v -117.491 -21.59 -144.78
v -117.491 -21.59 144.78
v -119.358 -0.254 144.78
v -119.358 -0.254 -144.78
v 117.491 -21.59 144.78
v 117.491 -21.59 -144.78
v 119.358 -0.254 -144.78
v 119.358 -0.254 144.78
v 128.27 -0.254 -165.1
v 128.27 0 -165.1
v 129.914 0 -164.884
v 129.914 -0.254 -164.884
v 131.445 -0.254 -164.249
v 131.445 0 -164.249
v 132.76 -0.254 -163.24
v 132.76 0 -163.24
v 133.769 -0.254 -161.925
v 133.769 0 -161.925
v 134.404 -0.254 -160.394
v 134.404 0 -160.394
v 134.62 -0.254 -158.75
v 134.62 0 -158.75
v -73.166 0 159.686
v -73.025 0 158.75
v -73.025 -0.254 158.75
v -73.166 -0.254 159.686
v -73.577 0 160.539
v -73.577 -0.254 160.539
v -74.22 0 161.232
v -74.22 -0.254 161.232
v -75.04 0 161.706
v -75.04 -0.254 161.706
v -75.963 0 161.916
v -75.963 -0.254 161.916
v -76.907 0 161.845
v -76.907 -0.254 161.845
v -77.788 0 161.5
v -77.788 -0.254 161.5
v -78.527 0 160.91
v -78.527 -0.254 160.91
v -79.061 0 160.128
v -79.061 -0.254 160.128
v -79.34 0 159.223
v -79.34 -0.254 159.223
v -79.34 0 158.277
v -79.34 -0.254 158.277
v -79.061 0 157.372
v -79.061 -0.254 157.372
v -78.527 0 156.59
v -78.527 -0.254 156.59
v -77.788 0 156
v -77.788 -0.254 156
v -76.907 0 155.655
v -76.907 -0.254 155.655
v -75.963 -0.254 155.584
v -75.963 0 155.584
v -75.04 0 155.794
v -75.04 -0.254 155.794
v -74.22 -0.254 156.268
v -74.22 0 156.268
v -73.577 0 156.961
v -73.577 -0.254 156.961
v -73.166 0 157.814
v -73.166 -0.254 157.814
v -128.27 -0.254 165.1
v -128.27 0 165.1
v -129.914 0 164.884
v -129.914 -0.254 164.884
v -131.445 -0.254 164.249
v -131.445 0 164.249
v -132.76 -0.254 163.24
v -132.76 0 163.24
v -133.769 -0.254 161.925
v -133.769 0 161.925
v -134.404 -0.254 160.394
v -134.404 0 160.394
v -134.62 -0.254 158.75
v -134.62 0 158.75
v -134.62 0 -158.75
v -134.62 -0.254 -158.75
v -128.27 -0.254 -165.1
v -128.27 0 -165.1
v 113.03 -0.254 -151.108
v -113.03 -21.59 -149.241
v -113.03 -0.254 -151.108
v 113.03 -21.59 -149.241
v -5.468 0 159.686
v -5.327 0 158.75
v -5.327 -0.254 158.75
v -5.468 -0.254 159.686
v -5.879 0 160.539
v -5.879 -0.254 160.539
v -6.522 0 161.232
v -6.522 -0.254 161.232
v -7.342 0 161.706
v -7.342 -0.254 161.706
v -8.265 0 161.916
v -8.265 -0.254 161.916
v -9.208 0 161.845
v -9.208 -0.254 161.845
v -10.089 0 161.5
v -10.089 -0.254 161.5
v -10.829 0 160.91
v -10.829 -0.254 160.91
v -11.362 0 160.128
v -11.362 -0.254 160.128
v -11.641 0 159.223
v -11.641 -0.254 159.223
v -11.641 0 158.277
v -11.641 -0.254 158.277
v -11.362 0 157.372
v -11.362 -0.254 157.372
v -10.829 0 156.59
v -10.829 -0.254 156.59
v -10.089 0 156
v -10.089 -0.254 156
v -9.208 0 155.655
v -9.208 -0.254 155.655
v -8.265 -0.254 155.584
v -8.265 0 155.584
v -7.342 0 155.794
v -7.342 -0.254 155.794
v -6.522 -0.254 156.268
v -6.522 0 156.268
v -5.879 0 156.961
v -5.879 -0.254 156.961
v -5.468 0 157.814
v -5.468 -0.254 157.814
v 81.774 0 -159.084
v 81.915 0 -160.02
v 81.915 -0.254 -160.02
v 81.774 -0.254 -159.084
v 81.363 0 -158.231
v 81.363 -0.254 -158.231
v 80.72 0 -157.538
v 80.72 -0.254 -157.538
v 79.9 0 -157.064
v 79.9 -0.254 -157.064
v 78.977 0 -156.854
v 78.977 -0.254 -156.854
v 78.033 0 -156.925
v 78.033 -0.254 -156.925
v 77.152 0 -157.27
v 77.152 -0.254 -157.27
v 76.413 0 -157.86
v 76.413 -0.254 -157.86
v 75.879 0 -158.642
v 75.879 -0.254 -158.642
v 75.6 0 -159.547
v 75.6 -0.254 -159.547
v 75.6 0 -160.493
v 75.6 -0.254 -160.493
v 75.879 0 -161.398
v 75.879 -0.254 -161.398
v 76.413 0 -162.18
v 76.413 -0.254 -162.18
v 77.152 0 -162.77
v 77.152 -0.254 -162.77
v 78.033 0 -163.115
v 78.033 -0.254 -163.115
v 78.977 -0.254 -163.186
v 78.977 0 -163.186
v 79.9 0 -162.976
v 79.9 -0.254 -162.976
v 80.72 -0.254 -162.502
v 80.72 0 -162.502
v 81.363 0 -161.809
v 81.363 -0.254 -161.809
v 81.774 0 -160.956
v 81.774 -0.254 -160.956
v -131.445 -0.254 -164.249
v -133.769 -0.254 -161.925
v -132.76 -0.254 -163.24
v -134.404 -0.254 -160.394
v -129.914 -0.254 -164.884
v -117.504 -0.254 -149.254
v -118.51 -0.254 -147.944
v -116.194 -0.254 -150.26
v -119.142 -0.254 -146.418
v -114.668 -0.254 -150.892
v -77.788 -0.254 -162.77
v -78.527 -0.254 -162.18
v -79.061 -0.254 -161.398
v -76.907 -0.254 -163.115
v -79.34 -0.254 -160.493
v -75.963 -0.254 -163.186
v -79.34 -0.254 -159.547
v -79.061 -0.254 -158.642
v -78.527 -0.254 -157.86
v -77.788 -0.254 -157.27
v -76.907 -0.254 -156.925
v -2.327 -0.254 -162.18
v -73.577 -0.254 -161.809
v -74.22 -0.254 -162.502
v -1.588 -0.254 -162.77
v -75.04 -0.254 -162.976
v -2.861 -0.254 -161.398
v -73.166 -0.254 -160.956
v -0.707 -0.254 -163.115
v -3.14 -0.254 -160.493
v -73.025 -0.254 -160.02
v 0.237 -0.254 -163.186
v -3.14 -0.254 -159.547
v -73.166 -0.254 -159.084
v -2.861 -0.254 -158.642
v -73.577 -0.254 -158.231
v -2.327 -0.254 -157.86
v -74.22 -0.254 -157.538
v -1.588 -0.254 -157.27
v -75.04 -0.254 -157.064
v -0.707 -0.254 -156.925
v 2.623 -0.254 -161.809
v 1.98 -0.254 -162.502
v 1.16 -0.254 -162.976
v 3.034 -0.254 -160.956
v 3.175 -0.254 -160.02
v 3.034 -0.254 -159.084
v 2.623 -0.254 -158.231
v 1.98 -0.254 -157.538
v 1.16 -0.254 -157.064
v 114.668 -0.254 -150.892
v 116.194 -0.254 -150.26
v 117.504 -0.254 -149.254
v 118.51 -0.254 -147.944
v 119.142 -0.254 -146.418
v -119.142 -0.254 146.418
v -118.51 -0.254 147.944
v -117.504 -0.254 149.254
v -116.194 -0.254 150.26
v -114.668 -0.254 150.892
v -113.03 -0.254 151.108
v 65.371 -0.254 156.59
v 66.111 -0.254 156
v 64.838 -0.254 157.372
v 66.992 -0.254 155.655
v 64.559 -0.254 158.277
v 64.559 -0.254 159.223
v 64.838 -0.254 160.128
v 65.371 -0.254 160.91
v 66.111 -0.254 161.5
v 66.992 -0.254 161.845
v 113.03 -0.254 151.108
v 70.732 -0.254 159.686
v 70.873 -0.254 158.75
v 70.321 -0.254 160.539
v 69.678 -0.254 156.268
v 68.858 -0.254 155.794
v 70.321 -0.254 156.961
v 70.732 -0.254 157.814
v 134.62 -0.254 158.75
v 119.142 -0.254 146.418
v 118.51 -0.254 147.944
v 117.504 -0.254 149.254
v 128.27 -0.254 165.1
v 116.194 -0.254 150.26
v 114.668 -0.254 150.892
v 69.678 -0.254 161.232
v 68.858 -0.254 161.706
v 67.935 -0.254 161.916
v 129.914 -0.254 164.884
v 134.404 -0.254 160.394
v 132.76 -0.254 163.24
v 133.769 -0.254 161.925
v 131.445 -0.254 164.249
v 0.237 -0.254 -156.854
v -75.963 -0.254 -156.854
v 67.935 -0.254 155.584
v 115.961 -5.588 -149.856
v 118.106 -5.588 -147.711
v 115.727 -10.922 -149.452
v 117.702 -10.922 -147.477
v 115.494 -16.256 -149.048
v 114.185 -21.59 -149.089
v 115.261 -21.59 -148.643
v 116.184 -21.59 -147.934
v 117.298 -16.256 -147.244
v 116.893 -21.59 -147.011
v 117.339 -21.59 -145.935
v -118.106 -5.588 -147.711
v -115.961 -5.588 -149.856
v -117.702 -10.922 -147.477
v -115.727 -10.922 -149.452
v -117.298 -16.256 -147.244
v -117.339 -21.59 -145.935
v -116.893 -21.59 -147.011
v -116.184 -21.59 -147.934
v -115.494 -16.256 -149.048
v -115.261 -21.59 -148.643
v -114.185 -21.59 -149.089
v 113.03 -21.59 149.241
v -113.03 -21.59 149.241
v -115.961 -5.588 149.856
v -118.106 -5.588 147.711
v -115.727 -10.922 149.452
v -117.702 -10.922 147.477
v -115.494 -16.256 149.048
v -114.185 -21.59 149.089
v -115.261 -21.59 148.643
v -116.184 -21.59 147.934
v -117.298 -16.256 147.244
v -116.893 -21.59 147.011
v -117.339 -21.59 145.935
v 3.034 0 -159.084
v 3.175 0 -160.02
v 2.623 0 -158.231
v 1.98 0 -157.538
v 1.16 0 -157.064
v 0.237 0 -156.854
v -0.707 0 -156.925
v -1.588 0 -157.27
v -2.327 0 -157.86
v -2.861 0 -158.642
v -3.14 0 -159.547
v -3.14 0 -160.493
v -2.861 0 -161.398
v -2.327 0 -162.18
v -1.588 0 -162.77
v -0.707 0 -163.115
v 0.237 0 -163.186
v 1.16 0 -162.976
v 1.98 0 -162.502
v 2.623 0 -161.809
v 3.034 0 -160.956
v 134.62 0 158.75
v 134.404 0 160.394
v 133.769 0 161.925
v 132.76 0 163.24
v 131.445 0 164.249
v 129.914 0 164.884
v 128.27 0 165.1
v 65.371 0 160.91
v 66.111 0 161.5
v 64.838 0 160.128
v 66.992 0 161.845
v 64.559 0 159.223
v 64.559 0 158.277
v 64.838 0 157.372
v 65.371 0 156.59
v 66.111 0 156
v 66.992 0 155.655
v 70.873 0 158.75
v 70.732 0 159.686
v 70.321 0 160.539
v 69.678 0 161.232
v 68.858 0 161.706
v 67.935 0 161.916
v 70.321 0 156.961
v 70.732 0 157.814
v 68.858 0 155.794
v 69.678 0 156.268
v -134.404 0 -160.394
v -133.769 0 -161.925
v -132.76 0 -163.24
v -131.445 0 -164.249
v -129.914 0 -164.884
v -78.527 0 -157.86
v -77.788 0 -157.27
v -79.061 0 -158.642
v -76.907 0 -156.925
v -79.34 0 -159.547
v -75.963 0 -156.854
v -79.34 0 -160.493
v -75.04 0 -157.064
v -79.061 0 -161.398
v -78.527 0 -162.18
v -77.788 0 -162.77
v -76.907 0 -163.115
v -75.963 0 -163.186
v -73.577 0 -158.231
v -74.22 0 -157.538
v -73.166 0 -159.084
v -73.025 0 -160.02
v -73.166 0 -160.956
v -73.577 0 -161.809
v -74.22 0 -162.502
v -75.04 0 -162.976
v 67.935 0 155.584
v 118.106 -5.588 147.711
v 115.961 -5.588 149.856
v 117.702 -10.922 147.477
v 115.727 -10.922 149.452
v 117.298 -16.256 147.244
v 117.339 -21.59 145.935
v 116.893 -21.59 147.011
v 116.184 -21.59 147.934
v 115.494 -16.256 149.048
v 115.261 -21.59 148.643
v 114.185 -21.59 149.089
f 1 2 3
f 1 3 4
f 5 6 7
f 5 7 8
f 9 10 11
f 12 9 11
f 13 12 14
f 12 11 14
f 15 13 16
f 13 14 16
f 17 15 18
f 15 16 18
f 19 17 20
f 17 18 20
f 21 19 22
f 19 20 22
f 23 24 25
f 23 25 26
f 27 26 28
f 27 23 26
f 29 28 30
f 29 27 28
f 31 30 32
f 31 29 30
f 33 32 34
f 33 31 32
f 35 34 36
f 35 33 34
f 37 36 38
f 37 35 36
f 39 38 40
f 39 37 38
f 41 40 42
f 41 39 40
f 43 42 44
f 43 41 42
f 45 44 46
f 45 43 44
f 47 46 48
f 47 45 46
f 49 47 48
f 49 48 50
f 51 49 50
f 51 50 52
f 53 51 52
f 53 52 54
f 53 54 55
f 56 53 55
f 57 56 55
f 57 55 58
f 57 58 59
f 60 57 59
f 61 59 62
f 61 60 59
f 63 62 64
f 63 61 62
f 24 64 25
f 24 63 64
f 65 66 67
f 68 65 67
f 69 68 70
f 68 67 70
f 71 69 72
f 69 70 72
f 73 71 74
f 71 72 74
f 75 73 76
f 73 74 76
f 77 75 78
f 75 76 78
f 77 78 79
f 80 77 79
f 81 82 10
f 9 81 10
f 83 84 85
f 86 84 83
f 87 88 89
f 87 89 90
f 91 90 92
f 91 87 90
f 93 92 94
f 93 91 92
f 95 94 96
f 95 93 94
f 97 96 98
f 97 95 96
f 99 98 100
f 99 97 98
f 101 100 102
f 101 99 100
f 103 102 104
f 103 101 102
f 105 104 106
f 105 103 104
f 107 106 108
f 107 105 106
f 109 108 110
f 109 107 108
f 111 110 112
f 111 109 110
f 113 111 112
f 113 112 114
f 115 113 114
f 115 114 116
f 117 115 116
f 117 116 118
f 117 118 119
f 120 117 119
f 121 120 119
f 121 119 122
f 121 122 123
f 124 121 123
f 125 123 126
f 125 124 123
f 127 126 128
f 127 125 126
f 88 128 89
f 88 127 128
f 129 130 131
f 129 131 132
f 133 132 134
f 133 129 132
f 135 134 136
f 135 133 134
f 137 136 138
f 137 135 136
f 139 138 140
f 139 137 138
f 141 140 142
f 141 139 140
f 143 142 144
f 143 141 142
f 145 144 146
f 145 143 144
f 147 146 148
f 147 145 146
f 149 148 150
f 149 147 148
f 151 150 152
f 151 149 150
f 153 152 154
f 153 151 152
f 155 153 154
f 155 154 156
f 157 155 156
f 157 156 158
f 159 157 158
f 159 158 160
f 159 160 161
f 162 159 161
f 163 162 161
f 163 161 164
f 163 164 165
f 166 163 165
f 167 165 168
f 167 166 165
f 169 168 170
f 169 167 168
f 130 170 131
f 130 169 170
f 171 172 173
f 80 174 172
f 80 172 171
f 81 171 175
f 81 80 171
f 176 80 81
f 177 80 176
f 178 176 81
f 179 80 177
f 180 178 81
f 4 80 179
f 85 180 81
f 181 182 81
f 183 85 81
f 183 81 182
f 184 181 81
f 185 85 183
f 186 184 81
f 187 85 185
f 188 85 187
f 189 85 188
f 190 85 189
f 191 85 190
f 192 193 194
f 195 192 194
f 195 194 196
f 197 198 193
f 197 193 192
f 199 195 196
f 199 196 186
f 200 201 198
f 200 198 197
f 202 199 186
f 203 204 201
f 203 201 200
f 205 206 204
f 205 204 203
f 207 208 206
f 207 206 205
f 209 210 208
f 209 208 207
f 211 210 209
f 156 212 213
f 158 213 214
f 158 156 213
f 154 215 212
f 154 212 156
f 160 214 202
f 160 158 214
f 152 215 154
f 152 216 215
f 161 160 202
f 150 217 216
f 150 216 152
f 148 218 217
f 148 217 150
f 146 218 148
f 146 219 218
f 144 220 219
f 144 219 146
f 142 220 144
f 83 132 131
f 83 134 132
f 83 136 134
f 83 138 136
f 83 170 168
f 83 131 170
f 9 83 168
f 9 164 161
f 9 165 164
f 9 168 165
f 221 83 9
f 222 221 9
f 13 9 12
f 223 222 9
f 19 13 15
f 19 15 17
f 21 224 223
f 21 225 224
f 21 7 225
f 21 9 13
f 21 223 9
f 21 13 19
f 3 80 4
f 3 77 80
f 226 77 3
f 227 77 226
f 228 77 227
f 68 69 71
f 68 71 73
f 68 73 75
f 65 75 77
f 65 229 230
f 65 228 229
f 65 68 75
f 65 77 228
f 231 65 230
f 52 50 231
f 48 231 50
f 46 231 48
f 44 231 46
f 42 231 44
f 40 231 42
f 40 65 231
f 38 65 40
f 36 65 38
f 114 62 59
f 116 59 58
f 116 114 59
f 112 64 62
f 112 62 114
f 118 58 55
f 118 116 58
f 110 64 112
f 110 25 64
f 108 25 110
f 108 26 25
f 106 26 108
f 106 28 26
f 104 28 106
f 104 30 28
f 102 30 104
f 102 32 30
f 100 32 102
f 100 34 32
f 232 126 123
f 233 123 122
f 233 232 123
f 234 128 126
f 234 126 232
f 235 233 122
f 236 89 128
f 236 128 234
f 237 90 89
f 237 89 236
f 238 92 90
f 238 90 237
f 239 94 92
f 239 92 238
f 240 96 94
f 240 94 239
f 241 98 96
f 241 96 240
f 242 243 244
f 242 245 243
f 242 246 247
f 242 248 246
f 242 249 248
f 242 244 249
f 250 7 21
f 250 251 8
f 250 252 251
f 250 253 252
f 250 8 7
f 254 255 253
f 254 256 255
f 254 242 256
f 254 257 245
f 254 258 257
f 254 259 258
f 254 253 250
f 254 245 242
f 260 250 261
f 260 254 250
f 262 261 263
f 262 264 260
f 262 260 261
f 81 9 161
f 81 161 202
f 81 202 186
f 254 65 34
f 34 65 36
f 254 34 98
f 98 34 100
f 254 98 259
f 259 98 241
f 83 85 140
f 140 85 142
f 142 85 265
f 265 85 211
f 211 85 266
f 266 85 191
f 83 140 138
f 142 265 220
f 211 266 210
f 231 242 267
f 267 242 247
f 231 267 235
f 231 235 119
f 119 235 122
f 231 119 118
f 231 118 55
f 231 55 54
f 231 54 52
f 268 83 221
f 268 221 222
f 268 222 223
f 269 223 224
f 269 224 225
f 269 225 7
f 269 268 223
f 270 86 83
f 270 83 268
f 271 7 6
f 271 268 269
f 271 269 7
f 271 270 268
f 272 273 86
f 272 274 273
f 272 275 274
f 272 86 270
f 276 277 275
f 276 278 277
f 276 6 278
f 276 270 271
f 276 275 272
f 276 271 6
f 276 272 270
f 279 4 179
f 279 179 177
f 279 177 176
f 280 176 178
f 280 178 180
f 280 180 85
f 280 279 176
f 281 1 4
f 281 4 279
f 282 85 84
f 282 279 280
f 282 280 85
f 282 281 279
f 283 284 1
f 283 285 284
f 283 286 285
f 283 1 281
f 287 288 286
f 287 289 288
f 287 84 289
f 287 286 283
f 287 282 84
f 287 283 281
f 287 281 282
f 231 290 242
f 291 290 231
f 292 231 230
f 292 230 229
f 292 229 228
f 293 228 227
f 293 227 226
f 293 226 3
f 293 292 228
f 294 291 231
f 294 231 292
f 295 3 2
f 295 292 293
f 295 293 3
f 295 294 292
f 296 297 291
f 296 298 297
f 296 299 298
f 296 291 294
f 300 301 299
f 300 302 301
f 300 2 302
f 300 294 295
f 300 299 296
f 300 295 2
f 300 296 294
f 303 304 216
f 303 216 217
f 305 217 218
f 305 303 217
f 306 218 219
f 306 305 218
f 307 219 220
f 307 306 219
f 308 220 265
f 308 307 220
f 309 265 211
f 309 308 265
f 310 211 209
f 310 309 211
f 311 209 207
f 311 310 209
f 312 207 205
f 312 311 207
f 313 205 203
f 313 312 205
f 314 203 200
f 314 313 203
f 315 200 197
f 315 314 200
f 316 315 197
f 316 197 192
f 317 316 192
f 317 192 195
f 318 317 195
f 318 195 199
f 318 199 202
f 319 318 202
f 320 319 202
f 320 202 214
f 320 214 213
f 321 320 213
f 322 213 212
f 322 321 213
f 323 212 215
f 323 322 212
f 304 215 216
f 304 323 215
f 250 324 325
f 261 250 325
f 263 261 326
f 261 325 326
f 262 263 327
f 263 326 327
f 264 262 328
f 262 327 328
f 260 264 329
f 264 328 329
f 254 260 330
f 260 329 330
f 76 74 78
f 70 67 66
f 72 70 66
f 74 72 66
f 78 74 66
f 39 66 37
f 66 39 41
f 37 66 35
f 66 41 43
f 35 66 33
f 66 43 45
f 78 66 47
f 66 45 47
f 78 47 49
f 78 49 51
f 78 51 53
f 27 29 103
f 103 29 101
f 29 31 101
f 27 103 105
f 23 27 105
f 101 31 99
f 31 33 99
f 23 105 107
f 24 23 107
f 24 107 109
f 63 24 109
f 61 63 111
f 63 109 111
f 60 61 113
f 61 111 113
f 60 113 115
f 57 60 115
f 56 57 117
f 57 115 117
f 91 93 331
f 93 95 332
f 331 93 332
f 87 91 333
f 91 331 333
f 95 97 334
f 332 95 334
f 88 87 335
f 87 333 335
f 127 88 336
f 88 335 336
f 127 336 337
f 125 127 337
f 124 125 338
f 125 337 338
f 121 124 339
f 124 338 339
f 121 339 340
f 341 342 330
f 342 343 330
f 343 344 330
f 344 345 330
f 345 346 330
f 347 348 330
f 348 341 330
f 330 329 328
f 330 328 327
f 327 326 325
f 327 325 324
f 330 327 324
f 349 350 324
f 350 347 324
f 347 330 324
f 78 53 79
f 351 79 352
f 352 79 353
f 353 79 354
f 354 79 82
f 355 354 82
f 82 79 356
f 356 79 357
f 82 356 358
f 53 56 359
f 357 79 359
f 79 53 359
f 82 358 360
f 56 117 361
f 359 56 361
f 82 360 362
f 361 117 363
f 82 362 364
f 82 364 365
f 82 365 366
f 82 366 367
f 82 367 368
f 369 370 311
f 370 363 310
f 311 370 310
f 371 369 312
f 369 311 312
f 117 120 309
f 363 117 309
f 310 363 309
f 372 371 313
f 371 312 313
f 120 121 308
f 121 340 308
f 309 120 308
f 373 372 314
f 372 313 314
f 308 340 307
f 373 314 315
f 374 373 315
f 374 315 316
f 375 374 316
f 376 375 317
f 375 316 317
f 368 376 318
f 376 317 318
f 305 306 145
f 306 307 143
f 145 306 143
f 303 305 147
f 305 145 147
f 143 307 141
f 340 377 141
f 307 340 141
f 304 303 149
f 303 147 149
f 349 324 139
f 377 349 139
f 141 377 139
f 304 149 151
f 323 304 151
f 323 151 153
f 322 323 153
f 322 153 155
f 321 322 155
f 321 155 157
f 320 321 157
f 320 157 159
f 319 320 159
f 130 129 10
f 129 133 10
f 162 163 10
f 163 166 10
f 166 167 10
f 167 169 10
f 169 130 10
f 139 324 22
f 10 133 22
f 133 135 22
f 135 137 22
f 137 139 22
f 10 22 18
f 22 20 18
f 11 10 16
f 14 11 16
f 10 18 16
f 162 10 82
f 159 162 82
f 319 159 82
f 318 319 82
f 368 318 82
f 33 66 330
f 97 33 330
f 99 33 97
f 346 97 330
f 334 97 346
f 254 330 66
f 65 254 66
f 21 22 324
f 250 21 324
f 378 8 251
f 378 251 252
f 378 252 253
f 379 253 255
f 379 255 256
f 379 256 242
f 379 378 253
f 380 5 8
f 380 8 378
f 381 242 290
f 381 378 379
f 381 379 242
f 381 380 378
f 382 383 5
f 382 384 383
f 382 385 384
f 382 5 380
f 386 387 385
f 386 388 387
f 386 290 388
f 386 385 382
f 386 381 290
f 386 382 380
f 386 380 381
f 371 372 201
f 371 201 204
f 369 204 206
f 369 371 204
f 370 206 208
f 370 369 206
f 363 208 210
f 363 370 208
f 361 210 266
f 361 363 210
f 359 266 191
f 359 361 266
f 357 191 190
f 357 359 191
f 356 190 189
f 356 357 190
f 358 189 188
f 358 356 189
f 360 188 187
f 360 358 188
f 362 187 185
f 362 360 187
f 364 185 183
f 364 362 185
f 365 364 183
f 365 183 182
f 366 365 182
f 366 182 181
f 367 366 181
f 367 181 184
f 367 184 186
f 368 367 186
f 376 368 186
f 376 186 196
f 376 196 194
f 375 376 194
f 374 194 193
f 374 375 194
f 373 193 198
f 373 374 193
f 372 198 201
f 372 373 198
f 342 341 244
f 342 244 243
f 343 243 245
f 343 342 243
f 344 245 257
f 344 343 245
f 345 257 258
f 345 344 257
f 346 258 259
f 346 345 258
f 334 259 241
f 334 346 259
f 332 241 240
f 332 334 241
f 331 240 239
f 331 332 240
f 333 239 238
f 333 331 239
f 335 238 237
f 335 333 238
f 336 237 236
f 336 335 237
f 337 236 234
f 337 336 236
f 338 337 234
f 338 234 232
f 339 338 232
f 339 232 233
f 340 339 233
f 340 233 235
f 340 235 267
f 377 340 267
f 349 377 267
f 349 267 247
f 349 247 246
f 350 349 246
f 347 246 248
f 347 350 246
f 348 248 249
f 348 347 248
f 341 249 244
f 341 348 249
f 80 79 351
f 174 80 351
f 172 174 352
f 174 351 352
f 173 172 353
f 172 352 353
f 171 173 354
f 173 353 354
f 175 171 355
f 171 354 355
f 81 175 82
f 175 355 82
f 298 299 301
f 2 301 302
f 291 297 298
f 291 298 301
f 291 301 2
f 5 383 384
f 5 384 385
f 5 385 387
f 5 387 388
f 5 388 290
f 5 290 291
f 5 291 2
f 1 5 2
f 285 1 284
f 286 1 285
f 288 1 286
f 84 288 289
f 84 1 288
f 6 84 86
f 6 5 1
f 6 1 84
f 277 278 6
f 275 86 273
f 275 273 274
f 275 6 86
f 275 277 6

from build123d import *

# Parameters (mm, degrees)
F0_R     = 3.175
F1_DEPTH = 0.254
F2_DEPTH = 21.59
F2_TAPER = 5


# Not quite as in the source:
# - a feature names something its author has since deleted; it is built from what else it names


with BuildPart() as f1:
    # F0 (on Front) → F1 (new body)
    with BuildSketch(Plane.XZ):
        with BuildLine():
            Line((-128.27, -165.1), (128.27, -165.1))
            ThreePointArc((128.27, -165.1), (132.7601280605, -163.2401280605), (134.62, -158.75))
            Line((134.62, -158.75), (134.62, 158.75))
            ThreePointArc((134.62, 158.75), (132.7601280605, 163.2401280605), (128.27, 165.1))
            Line((128.27, 165.1), (-128.27, 165.1))
            ThreePointArc((-128.27, 165.1), (-132.7601280605, 163.2401280605), (-134.62, 158.75))
            Line((-134.62, 158.75), (-134.62, -158.75))
            ThreePointArc((-134.62, -158.75), (-132.7601280605, -163.2401280605), (-128.27, -165.1))
        make_face()
        with Locations((-76.2, -160.02)):
            Circle(F0_R, mode=Mode.SUBTRACT)
        with Locations((0, -160.02)):
            Circle(F0_R, mode=Mode.SUBTRACT)
        with Locations((78.74, -160.02)):
            Circle(F0_R, mode=Mode.SUBTRACT)
        with Locations((-76.2, 158.75)):
            Circle(F0_R, mode=Mode.SUBTRACT)
        with Locations((-8.5018249229, 158.75)):
            Circle(F0_R, mode=Mode.SUBTRACT)
        with BuildLine():
            ThreePointArc((119.38, -144.78), (117.5201280605, -149.2701280605), (113.03, -151.13))
            Line((113.03, -151.13), (76.2, -151.13))
            Line((76.2, -151.13), (-76.2, -151.13))
            Line((-76.2, -151.13), (-113.03, -151.13))
            ThreePointArc((-113.03, -151.13), (-117.5201280605, -149.2701280605), (-119.38, -144.78))
            Line((-119.38, -144.78), (-119.38, 144.78))
            ThreePointArc((-119.38, 144.78), (-117.5201280605, 149.2701280605), (-113.03, 151.13))
            Line((-113.03, 151.13), (-76.2, 151.13))
            Line((-76.2, 151.13), (76.2, 151.13))
            Line((76.2, 151.13), (113.03, 151.13))
            ThreePointArc((113.03, 151.13), (117.5201280605, 149.2701280605), (119.38, 144.78))
            Line((119.38, 144.78), (119.38, -144.78))
        make_face(mode=Mode.SUBTRACT)
        with Locations((67.6981750771, 158.75)):
            Circle(F0_R, mode=Mode.SUBTRACT)
        with BuildLine():
            Line((76.2, -151.13), (113.03, -151.13))
            ThreePointArc((113.03, -151.13), (117.5201280605, -149.2701280605), (119.38, -144.78))
            Line((119.38, -144.78), (119.38, 144.78))
            ThreePointArc((119.38, 144.78), (117.5201280605, 149.2701280605), (113.03, 151.13))
            Line((113.03, 151.13), (76.2, 151.13))
            Line((76.2, 151.13), (-76.2, 151.13))
            Line((-76.2, 151.13), (-113.03, 151.13))
            ThreePointArc((-113.03, 151.13), (-117.5201280605, 149.2701280605), (-119.38, 144.78))
            Line((-119.38, 144.78), (-119.38, -144.78))
            ThreePointArc((-119.38, -144.78), (-117.5201280605, -149.2701280605), (-113.03, -151.13))
            Line((-113.03, -151.13), (-76.2, -151.13))
            Line((-76.2, -151.13), (76.2, -151.13))
        make_face()
    extrude(amount=F1_DEPTH)

    # F0 (on Front) → F2 (join)
    with BuildSketch(Plane.XZ):
        with BuildLine():
            Line((76.2, -151.13), (113.03, -151.13))
            ThreePointArc((113.03, -151.13), (117.5201280605, -149.2701280605), (119.38, -144.78))
            Line((119.38, -144.78), (119.38, 144.78))
            ThreePointArc((119.38, 144.78), (117.5201280605, 149.2701280605), (113.03, 151.13))
            Line((113.03, 151.13), (76.2, 151.13))
            Line((76.2, 151.13), (-76.2, 151.13))
            Line((-76.2, 151.13), (-113.03, 151.13))
            ThreePointArc((-113.03, 151.13), (-117.5201280605, 149.2701280605), (-119.38, 144.78))
            Line((-119.38, 144.78), (-119.38, -144.78))
            ThreePointArc((-119.38, -144.78), (-117.5201280605, -149.2701280605), (-113.03, -151.13))
            Line((-113.03, -151.13), (-76.2, -151.13))
            Line((-76.2, -151.13), (76.2, -151.13))
        make_face()
    extrude(amount=F2_DEPTH, taper=F2_TAPER)


solid = f1.part
